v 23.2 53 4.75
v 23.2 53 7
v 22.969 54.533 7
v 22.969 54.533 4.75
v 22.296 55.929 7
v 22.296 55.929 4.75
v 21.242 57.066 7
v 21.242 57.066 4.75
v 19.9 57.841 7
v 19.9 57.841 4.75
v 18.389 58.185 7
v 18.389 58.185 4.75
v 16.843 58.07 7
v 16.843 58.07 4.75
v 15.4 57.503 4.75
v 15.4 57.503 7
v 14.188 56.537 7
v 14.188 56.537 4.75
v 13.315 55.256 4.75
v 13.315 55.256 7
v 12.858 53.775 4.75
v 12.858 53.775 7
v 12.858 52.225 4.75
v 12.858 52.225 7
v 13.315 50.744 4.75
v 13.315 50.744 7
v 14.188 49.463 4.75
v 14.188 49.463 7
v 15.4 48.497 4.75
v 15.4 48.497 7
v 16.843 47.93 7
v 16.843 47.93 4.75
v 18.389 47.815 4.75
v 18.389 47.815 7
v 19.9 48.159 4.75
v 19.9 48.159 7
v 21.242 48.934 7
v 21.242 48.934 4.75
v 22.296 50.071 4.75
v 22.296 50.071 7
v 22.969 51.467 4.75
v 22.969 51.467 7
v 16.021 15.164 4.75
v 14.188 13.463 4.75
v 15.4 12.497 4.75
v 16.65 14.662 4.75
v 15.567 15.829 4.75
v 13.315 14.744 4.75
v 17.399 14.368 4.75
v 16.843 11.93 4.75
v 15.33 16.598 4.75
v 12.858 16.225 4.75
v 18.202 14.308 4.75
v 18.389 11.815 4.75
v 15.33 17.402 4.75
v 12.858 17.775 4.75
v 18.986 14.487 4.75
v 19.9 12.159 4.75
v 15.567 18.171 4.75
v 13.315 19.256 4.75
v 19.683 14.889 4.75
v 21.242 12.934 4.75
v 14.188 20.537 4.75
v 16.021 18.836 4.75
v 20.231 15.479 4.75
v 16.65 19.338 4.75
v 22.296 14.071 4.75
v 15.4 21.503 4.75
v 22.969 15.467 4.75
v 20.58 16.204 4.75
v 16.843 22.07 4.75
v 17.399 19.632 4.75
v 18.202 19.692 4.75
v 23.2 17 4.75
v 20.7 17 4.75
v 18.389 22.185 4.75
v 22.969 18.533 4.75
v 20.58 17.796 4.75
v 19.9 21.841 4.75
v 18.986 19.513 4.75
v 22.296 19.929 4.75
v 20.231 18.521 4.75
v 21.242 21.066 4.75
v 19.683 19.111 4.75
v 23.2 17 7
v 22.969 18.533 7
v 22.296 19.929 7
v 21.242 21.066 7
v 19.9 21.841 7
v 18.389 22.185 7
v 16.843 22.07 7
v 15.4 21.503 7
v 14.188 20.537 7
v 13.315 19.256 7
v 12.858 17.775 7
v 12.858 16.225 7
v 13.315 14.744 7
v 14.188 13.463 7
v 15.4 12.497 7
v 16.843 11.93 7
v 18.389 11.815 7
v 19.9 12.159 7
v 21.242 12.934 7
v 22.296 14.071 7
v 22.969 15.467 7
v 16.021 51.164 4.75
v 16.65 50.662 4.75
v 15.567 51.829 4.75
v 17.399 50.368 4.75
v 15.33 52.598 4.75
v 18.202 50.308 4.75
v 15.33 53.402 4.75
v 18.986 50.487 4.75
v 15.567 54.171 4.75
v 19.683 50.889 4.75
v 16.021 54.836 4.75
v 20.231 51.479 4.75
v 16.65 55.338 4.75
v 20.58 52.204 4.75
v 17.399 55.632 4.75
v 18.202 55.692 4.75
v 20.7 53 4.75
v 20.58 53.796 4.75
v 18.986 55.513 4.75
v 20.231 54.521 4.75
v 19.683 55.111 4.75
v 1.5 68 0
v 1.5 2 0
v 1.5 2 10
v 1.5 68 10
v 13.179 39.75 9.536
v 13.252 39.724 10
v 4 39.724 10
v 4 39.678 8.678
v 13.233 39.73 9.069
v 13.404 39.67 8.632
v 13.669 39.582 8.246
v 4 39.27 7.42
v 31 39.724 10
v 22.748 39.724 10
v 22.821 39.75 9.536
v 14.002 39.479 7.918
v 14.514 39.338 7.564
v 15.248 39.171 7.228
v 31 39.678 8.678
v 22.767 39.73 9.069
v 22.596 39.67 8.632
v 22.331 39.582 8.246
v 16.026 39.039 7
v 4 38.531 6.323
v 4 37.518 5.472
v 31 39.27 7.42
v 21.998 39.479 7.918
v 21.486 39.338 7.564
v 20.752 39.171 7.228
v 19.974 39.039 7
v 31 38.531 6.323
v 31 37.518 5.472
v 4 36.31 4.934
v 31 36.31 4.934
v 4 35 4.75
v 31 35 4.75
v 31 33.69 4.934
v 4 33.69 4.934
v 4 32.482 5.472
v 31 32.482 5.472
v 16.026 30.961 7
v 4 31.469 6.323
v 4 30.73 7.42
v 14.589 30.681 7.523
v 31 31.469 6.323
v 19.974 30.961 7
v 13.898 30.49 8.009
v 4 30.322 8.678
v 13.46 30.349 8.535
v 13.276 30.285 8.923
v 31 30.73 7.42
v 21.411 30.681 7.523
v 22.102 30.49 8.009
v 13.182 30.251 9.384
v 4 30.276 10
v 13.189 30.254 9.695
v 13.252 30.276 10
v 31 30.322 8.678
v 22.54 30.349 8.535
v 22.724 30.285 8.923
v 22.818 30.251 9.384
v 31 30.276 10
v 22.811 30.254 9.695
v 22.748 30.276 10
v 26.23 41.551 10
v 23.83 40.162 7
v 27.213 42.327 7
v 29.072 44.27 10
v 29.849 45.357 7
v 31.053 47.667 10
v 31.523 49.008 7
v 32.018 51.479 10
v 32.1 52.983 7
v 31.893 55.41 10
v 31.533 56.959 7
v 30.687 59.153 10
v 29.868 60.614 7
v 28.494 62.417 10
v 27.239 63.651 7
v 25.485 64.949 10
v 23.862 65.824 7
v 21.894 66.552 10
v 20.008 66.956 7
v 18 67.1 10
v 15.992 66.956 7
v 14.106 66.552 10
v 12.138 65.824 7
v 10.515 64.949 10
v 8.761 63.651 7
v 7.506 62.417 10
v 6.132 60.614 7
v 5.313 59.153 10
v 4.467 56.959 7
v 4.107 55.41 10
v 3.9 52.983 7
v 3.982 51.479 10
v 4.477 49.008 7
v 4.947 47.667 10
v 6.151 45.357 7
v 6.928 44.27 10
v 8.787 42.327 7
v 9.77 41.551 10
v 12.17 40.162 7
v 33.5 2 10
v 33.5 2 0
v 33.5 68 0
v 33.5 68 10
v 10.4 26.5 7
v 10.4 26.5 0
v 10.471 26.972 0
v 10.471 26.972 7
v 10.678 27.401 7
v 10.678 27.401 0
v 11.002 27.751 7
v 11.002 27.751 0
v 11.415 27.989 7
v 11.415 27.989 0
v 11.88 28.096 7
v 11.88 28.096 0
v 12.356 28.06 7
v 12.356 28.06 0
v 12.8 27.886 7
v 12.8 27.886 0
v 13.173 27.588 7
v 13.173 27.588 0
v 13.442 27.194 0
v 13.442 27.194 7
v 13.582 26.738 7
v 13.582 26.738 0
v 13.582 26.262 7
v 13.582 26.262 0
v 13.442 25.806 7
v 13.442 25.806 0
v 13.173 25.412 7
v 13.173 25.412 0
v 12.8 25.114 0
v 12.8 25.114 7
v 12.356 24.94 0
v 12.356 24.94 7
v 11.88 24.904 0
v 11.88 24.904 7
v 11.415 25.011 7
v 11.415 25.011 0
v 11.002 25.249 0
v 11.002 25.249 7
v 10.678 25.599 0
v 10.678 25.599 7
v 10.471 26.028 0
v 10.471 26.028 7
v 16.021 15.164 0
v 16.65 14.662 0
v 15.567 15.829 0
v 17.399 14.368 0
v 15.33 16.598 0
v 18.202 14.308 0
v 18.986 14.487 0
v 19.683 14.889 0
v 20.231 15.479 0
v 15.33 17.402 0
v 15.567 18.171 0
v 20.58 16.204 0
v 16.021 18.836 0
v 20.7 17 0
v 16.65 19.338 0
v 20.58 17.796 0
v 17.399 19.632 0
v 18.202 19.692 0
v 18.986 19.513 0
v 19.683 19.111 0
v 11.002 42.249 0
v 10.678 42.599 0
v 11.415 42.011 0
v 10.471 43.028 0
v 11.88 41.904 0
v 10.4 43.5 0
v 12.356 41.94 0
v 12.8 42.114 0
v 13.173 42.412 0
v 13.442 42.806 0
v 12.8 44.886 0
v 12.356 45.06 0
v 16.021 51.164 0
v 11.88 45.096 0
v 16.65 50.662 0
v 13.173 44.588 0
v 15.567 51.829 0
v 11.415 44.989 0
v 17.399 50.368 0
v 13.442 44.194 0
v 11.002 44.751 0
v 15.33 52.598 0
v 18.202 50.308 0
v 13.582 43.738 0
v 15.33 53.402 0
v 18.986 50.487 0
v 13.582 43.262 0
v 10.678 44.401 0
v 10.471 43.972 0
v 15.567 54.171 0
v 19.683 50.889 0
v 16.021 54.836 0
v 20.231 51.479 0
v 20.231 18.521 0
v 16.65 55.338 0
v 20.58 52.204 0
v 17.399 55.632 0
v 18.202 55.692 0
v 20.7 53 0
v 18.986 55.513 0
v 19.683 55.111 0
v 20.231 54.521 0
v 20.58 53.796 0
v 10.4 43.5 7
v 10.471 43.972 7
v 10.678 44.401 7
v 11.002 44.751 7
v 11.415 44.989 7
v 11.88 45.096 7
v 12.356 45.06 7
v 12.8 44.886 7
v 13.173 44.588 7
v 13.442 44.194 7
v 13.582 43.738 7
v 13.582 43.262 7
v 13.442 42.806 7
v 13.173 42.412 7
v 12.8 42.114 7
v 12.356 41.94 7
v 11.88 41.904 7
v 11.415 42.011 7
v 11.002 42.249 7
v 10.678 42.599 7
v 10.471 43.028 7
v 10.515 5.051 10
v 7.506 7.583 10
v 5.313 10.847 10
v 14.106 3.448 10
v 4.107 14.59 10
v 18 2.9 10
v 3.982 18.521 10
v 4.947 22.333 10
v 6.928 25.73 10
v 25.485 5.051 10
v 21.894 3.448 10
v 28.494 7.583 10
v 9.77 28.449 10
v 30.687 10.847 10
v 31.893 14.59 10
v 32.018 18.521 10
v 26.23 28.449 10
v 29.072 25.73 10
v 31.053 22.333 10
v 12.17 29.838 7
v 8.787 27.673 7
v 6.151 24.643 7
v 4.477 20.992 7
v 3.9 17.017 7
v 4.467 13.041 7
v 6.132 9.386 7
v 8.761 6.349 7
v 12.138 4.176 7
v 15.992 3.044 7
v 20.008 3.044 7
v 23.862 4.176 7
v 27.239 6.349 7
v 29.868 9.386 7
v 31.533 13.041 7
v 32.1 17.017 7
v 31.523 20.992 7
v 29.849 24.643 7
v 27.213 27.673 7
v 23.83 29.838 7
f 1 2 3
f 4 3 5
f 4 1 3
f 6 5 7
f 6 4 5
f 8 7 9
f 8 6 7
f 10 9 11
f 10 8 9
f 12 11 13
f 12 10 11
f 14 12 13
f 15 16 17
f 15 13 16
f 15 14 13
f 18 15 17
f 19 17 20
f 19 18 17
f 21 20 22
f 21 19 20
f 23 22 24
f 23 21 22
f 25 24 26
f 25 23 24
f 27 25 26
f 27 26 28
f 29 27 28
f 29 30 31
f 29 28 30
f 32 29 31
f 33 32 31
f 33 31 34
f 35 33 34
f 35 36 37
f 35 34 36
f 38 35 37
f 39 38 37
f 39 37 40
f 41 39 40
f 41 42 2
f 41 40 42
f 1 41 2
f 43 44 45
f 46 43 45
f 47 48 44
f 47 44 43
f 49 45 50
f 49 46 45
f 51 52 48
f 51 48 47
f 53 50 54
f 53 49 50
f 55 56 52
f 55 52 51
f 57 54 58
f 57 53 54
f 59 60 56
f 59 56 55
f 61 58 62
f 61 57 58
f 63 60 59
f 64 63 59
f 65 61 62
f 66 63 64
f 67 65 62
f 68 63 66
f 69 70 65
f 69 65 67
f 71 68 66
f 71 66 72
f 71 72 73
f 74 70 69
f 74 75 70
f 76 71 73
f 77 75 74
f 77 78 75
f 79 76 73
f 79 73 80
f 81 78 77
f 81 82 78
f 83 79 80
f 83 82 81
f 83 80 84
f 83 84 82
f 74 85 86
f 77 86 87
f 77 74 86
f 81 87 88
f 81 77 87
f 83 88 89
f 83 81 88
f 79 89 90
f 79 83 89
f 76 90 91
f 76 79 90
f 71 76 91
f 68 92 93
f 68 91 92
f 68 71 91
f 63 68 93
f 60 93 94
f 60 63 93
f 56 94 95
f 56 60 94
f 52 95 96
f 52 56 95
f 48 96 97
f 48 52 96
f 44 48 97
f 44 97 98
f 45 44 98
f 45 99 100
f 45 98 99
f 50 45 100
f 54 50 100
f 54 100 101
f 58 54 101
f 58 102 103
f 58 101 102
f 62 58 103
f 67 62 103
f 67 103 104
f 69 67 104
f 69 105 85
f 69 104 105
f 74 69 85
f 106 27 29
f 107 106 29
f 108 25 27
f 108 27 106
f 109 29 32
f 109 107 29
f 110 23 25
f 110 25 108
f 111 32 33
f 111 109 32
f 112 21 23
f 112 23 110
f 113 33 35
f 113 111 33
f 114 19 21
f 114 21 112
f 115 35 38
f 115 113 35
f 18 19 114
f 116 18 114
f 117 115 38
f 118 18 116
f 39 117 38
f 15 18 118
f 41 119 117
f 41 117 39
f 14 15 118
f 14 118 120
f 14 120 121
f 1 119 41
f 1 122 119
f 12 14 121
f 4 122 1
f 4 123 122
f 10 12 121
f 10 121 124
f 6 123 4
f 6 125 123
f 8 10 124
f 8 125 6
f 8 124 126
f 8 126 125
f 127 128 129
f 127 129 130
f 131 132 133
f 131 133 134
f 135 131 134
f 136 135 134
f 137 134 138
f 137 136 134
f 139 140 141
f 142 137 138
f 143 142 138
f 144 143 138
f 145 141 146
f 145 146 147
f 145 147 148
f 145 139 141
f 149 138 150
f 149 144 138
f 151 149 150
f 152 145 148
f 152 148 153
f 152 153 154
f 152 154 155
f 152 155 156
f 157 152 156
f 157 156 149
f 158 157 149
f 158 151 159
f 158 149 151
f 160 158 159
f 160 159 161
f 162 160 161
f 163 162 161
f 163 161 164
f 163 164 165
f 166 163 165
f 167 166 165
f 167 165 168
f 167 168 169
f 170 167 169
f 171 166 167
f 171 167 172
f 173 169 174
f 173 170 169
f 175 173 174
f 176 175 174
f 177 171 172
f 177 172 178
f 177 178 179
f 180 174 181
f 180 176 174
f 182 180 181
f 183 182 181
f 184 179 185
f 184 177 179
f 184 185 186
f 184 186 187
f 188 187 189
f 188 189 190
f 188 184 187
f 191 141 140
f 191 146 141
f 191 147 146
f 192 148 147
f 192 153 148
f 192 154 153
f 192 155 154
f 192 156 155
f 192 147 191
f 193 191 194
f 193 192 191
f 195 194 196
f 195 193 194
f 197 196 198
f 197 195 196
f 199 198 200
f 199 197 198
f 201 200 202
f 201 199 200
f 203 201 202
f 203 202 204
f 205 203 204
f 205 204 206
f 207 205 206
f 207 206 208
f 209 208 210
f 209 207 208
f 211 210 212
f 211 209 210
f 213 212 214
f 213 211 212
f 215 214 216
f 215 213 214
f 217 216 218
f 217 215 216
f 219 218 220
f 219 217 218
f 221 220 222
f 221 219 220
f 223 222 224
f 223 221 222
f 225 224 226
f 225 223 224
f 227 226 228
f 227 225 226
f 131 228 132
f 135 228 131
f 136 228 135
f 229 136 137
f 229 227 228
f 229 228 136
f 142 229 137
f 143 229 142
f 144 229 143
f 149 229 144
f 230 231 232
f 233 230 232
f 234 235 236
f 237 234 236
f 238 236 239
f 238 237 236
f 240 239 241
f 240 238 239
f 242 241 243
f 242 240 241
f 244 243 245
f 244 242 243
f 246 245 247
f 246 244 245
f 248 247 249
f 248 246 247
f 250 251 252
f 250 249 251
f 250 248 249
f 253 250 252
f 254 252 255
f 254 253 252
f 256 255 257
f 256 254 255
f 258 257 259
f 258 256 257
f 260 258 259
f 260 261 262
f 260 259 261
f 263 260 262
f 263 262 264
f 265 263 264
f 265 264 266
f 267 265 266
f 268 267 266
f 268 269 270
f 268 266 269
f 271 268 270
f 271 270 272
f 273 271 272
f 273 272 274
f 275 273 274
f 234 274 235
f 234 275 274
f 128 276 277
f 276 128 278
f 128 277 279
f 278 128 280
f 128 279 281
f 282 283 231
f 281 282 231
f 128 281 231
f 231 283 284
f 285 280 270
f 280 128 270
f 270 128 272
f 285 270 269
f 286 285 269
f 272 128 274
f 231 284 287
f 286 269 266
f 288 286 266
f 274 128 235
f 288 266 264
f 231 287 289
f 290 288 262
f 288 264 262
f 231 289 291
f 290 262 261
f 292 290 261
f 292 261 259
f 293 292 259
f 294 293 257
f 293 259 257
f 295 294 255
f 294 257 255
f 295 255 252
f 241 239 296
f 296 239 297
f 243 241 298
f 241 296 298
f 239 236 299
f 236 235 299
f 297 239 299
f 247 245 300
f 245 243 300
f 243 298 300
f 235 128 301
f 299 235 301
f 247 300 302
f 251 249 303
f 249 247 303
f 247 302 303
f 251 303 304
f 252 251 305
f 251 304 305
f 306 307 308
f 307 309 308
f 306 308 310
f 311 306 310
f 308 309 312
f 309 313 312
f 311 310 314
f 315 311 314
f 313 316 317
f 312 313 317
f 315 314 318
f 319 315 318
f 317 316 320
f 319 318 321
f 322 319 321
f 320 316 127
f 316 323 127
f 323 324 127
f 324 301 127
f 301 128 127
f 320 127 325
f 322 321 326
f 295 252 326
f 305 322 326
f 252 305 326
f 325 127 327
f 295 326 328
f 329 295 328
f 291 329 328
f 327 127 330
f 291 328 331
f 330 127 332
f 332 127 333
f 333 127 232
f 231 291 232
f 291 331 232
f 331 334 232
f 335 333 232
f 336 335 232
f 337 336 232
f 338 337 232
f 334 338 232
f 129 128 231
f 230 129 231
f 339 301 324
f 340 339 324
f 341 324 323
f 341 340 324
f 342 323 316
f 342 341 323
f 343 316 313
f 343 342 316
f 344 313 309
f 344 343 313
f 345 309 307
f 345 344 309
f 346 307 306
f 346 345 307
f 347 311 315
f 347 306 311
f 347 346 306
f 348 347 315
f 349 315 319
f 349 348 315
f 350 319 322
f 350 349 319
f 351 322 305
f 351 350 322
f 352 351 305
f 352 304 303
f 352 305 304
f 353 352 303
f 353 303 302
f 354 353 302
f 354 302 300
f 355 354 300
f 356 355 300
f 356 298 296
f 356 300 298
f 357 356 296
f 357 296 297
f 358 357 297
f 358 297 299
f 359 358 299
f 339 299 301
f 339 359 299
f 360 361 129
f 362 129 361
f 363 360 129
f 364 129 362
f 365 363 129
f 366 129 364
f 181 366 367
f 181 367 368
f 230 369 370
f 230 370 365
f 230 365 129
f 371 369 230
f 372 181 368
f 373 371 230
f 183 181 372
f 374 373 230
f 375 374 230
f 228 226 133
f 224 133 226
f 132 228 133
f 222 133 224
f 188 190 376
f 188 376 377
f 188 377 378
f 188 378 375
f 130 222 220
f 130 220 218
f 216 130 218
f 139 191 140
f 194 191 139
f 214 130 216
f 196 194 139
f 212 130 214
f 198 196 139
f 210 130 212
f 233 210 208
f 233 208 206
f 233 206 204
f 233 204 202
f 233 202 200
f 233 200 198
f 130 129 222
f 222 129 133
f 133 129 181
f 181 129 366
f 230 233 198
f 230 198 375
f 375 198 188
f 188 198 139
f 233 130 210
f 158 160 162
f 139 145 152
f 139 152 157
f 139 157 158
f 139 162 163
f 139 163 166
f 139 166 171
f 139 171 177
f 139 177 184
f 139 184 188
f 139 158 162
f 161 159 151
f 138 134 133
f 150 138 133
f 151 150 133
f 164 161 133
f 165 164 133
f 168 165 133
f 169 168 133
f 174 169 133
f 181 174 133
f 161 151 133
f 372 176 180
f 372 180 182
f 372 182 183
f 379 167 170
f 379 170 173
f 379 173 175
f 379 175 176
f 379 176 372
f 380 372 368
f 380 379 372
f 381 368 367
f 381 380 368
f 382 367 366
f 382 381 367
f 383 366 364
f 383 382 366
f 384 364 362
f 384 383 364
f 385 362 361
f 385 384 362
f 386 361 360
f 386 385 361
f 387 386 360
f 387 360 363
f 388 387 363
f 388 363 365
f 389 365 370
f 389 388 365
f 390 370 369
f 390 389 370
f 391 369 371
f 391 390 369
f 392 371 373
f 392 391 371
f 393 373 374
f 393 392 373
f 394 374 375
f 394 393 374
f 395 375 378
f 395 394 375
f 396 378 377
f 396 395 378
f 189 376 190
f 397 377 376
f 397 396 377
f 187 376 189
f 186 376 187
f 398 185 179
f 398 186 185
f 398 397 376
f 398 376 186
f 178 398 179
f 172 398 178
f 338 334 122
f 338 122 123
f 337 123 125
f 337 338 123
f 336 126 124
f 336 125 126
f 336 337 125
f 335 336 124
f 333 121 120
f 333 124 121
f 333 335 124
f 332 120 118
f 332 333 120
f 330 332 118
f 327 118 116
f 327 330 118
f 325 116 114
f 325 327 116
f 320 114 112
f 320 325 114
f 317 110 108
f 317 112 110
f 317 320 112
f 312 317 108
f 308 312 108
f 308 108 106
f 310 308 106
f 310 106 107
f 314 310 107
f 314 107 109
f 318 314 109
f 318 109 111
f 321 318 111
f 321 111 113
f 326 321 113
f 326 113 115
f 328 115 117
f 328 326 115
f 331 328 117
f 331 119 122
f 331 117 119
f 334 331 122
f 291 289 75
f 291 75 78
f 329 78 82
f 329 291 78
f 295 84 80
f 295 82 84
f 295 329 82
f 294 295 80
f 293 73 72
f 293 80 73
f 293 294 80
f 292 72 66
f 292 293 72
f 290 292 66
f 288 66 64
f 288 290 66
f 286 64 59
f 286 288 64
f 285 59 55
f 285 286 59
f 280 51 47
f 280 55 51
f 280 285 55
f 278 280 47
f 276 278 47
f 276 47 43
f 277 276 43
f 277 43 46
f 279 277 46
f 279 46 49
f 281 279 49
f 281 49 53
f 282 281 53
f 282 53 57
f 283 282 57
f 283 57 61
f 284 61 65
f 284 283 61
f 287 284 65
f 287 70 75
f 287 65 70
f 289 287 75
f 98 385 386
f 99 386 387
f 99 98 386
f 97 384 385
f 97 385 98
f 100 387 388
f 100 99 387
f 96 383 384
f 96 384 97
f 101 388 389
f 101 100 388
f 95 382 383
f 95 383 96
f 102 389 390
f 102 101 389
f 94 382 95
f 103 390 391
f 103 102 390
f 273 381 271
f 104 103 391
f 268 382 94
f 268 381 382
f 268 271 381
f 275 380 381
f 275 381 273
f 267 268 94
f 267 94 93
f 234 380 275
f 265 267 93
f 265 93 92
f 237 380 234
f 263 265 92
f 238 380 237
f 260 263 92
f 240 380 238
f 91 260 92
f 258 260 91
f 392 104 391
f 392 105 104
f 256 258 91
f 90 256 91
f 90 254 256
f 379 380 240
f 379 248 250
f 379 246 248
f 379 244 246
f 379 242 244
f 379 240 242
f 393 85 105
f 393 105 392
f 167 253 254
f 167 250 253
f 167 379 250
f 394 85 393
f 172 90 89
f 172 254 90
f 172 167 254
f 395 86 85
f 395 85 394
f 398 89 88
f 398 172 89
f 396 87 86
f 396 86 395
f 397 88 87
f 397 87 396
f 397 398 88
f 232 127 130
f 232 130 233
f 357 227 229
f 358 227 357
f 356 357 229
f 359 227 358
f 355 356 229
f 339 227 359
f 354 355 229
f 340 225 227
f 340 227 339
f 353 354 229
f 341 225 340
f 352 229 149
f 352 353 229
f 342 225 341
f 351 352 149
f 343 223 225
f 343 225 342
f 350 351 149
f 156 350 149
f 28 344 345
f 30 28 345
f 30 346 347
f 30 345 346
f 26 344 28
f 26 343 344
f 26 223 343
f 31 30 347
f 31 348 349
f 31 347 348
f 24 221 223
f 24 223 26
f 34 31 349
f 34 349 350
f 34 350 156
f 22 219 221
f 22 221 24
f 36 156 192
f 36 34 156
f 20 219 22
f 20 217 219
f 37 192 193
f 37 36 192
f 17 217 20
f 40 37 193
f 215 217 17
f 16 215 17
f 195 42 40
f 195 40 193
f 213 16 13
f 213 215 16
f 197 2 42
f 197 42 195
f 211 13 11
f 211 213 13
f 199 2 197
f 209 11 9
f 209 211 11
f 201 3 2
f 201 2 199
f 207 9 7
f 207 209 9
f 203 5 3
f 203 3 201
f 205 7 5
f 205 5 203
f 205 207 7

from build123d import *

# Parameters (mm, degrees)
CYLINDER1331_R                     = 1.6
CYLINDER1331_DEPTH                 = 60
CYLINDER1332_R                     = 1.6
CYLINDER1332_DEPTH                 = 60
CYLINDER1333_R                     = 1.6
CYLINDER1333_DEPTH                 = 60
CYLINDER1330_R                     = 1.6
CYLINDER1330_DEPTH                 = 60
FUSION248002050200_PLACEMENT_ANGLE = 90
CYLINDER1329_R                     = 2.7
CYLINDER1329_DEPTH                 = 15
CYLINDER1328_R                     = 2.7
CYLINDER1328_DEPTH                 = 15
CYLINDER1327_R                     = 4.75
CYLINDER1327_DEPTH                 = 27
CYLINDER1326_R                     = 5.2
CYLINDER1326_DEPTH                 = 9.5
CYLINDER1323_R                     = 14.1
CYLINDER1323_DEPTH                 = 5
CYLINDER1324_R                     = 14.1
CYLINDER1324_DEPTH                 = 5
CYLINDER1325_R                     = 5.2
CYLINDER1325_DEPTH                 = 9.5
FUSION248002050201_PLACEMENT_ANGLE = 90
BOX545_W                           = 32
BOX545_H                           = 66
BOX545_DEPTH                       = 10


with BuildPart() as cylinder1331:
    # Cylinder1331 → Cylinder1331 (new body)
    with BuildSketch(Plane(origin=(432, 67, 100), x_dir=(0, 0, -1), z_dir=(1, 0, 0))):
        Circle(CYLINDER1331_R)
    extrude(amount=CYLINDER1331_DEPTH)


with BuildPart() as cylinder1332:
    # Cylinder1332 → Cylinder1332 (new body)
    with BuildSketch(Plane(origin=(432, 93.5, 94), x_dir=(0, 0, -1), z_dir=(1, 0, 0))):
        Circle(CYLINDER1332_R)
    extrude(amount=CYLINDER1332_DEPTH)


with BuildPart() as cylinder1333:
    # Cylinder1333 → Cylinder1333 (new body)
    with BuildSketch(Plane(origin=(432, 76.5, 94), x_dir=(0, 0, -1), z_dir=(1, 0, 0))):
        Circle(CYLINDER1333_R)
    extrude(amount=CYLINDER1333_DEPTH)


with BuildPart() as fusion248002050200:
    # Cylinder1330 → Cylinder1330 (new body)
    with BuildSketch(Plane(origin=(432, 103, 100), x_dir=(0, 0, -1), z_dir=(1, 0, 0))):
        Circle(CYLINDER1330_R)
    extrude(amount=CYLINDER1330_DEPTH)

    # Fusion248002050200: union Cylinder1331, Cylinder1332, Cylinder1333
    add(cylinder1331.part)
    add(cylinder1332.part)
    add(cylinder1333.part)


with BuildPart() as fusion248002050200_1:
    # Fusion248002050200 placement: moved
    add(fusion248002050200.part.moved(Location((-82, -50, 452))).rotate(Axis((-82, -50, 452), (0, 1, 0)), FUSION248002050200_PLACEMENT_ANGLE))


with BuildPart() as cylinder1329:
    # Cylinder1329 → Cylinder1329 (new body)
    with BuildSketch(Plane(origin=(428.75, 103, 100), x_dir=(0, 0, -1), z_dir=(1, 0, 0))):
        Circle(CYLINDER1329_R)
    extrude(amount=CYLINDER1329_DEPTH)


with BuildPart() as cylinder1328:
    # Cylinder1328 → Cylinder1328 (new body)
    with BuildSketch(Plane(origin=(428.75, 67, 100), x_dir=(0, 0, -1), z_dir=(1, 0, 0))):
        Circle(CYLINDER1328_R)
    extrude(amount=CYLINDER1328_DEPTH)


with BuildPart() as cylinder1327:
    # Cylinder1327 → Cylinder1327 (new body)
    with BuildSketch(Plane(origin=(441.5, 85, 87), x_dir=(1, 0, 0), z_dir=(0, 0, 1))):
        Circle(CYLINDER1327_R)
    extrude(amount=CYLINDER1327_DEPTH)


with BuildPart() as cylinder1326:
    # Cylinder1326 → Cylinder1326 (new body)
    with BuildSketch(Plane(origin=(434.75, 102.5, 100), x_dir=(0, 0, -1), z_dir=(1, 0, 0))):
        Circle(CYLINDER1326_R)
    extrude(amount=CYLINDER1326_DEPTH)


with BuildPart() as fusion248002050199:
    # Cylinder1323 → Cylinder1323 (new body)
    with BuildSketch(Plane(origin=(437, 102.5, 100), x_dir=(0, 0, -1), z_dir=(1, 0, 0))):
        Circle(CYLINDER1323_R)
    extrude(amount=CYLINDER1323_DEPTH)

    # Fusion248002050199: union Cylinder1326
    add(cylinder1326.part)


with BuildPart() as fusion248002050199_1:
    # Fusion248002050199 placement: moved
    add(fusion248002050199.part.moved(Location((2, 0.5, 0))))


with BuildPart() as cylinder1324:
    # Cylinder1324 → Cylinder1324 (new body)
    with BuildSketch(Plane(origin=(437, 67.5, 100), x_dir=(0, 0, -1), z_dir=(1, 0, 0))):
        Circle(CYLINDER1324_R)
    extrude(amount=CYLINDER1324_DEPTH)


with BuildPart() as fusion248002050201:
    # Cylinder1325 → Cylinder1325 (new body)
    with BuildSketch(Plane(origin=(434.75, 67.5, 100), x_dir=(0, 0, -1), z_dir=(1, 0, 0))):
        Circle(CYLINDER1325_R)
    extrude(amount=CYLINDER1325_DEPTH)

    # Fusion248002050198: union Cylinder1324
    add(cylinder1324.part)


with BuildPart() as fusion248002050201_1:
    # Fusion248002050198 placement: moved
    add(fusion248002050201.part.moved(Location((2, -0.5, 0))))

    # Fusion248002050201: union Cylinder1329, Cylinder1328, Cylinder1327, Fusion248002050199
    add(cylinder1329.part)
    add(cylinder1328.part)
    add(cylinder1327.part)
    add(fusion248002050199_1.part)


with BuildPart() as fusion248002050201_2:
    # Fusion248002050201 placement: moved
    add(fusion248002050201_1.part.moved(Location((118, -50, -432))).rotate(Axis((118, -50, -432), (0, -1, 0)), FUSION248002050201_PLACEMENT_ANGLE))


with BuildPart() as bucket_gears_holes:
    # Box545 → Box545 (new body)
    with BuildSketch(Plane(origin=(1.5, 2, 0), x_dir=(1, 0, 0), z_dir=(0, 0, 1))):
        with Locations((16, 33)):
            Rectangle(BOX545_W, BOX545_H)
    extrude(amount=BOX545_DEPTH)

    # Cut: cut Fusion248002050201
    add(fusion248002050201_2.part, mode=Mode.SUBTRACT)

    # Cut014344: cut Fusion248002050200
    add(fusion248002050200_1.part, mode=Mode.SUBTRACT)


solid = bucket_gears_holes.part
